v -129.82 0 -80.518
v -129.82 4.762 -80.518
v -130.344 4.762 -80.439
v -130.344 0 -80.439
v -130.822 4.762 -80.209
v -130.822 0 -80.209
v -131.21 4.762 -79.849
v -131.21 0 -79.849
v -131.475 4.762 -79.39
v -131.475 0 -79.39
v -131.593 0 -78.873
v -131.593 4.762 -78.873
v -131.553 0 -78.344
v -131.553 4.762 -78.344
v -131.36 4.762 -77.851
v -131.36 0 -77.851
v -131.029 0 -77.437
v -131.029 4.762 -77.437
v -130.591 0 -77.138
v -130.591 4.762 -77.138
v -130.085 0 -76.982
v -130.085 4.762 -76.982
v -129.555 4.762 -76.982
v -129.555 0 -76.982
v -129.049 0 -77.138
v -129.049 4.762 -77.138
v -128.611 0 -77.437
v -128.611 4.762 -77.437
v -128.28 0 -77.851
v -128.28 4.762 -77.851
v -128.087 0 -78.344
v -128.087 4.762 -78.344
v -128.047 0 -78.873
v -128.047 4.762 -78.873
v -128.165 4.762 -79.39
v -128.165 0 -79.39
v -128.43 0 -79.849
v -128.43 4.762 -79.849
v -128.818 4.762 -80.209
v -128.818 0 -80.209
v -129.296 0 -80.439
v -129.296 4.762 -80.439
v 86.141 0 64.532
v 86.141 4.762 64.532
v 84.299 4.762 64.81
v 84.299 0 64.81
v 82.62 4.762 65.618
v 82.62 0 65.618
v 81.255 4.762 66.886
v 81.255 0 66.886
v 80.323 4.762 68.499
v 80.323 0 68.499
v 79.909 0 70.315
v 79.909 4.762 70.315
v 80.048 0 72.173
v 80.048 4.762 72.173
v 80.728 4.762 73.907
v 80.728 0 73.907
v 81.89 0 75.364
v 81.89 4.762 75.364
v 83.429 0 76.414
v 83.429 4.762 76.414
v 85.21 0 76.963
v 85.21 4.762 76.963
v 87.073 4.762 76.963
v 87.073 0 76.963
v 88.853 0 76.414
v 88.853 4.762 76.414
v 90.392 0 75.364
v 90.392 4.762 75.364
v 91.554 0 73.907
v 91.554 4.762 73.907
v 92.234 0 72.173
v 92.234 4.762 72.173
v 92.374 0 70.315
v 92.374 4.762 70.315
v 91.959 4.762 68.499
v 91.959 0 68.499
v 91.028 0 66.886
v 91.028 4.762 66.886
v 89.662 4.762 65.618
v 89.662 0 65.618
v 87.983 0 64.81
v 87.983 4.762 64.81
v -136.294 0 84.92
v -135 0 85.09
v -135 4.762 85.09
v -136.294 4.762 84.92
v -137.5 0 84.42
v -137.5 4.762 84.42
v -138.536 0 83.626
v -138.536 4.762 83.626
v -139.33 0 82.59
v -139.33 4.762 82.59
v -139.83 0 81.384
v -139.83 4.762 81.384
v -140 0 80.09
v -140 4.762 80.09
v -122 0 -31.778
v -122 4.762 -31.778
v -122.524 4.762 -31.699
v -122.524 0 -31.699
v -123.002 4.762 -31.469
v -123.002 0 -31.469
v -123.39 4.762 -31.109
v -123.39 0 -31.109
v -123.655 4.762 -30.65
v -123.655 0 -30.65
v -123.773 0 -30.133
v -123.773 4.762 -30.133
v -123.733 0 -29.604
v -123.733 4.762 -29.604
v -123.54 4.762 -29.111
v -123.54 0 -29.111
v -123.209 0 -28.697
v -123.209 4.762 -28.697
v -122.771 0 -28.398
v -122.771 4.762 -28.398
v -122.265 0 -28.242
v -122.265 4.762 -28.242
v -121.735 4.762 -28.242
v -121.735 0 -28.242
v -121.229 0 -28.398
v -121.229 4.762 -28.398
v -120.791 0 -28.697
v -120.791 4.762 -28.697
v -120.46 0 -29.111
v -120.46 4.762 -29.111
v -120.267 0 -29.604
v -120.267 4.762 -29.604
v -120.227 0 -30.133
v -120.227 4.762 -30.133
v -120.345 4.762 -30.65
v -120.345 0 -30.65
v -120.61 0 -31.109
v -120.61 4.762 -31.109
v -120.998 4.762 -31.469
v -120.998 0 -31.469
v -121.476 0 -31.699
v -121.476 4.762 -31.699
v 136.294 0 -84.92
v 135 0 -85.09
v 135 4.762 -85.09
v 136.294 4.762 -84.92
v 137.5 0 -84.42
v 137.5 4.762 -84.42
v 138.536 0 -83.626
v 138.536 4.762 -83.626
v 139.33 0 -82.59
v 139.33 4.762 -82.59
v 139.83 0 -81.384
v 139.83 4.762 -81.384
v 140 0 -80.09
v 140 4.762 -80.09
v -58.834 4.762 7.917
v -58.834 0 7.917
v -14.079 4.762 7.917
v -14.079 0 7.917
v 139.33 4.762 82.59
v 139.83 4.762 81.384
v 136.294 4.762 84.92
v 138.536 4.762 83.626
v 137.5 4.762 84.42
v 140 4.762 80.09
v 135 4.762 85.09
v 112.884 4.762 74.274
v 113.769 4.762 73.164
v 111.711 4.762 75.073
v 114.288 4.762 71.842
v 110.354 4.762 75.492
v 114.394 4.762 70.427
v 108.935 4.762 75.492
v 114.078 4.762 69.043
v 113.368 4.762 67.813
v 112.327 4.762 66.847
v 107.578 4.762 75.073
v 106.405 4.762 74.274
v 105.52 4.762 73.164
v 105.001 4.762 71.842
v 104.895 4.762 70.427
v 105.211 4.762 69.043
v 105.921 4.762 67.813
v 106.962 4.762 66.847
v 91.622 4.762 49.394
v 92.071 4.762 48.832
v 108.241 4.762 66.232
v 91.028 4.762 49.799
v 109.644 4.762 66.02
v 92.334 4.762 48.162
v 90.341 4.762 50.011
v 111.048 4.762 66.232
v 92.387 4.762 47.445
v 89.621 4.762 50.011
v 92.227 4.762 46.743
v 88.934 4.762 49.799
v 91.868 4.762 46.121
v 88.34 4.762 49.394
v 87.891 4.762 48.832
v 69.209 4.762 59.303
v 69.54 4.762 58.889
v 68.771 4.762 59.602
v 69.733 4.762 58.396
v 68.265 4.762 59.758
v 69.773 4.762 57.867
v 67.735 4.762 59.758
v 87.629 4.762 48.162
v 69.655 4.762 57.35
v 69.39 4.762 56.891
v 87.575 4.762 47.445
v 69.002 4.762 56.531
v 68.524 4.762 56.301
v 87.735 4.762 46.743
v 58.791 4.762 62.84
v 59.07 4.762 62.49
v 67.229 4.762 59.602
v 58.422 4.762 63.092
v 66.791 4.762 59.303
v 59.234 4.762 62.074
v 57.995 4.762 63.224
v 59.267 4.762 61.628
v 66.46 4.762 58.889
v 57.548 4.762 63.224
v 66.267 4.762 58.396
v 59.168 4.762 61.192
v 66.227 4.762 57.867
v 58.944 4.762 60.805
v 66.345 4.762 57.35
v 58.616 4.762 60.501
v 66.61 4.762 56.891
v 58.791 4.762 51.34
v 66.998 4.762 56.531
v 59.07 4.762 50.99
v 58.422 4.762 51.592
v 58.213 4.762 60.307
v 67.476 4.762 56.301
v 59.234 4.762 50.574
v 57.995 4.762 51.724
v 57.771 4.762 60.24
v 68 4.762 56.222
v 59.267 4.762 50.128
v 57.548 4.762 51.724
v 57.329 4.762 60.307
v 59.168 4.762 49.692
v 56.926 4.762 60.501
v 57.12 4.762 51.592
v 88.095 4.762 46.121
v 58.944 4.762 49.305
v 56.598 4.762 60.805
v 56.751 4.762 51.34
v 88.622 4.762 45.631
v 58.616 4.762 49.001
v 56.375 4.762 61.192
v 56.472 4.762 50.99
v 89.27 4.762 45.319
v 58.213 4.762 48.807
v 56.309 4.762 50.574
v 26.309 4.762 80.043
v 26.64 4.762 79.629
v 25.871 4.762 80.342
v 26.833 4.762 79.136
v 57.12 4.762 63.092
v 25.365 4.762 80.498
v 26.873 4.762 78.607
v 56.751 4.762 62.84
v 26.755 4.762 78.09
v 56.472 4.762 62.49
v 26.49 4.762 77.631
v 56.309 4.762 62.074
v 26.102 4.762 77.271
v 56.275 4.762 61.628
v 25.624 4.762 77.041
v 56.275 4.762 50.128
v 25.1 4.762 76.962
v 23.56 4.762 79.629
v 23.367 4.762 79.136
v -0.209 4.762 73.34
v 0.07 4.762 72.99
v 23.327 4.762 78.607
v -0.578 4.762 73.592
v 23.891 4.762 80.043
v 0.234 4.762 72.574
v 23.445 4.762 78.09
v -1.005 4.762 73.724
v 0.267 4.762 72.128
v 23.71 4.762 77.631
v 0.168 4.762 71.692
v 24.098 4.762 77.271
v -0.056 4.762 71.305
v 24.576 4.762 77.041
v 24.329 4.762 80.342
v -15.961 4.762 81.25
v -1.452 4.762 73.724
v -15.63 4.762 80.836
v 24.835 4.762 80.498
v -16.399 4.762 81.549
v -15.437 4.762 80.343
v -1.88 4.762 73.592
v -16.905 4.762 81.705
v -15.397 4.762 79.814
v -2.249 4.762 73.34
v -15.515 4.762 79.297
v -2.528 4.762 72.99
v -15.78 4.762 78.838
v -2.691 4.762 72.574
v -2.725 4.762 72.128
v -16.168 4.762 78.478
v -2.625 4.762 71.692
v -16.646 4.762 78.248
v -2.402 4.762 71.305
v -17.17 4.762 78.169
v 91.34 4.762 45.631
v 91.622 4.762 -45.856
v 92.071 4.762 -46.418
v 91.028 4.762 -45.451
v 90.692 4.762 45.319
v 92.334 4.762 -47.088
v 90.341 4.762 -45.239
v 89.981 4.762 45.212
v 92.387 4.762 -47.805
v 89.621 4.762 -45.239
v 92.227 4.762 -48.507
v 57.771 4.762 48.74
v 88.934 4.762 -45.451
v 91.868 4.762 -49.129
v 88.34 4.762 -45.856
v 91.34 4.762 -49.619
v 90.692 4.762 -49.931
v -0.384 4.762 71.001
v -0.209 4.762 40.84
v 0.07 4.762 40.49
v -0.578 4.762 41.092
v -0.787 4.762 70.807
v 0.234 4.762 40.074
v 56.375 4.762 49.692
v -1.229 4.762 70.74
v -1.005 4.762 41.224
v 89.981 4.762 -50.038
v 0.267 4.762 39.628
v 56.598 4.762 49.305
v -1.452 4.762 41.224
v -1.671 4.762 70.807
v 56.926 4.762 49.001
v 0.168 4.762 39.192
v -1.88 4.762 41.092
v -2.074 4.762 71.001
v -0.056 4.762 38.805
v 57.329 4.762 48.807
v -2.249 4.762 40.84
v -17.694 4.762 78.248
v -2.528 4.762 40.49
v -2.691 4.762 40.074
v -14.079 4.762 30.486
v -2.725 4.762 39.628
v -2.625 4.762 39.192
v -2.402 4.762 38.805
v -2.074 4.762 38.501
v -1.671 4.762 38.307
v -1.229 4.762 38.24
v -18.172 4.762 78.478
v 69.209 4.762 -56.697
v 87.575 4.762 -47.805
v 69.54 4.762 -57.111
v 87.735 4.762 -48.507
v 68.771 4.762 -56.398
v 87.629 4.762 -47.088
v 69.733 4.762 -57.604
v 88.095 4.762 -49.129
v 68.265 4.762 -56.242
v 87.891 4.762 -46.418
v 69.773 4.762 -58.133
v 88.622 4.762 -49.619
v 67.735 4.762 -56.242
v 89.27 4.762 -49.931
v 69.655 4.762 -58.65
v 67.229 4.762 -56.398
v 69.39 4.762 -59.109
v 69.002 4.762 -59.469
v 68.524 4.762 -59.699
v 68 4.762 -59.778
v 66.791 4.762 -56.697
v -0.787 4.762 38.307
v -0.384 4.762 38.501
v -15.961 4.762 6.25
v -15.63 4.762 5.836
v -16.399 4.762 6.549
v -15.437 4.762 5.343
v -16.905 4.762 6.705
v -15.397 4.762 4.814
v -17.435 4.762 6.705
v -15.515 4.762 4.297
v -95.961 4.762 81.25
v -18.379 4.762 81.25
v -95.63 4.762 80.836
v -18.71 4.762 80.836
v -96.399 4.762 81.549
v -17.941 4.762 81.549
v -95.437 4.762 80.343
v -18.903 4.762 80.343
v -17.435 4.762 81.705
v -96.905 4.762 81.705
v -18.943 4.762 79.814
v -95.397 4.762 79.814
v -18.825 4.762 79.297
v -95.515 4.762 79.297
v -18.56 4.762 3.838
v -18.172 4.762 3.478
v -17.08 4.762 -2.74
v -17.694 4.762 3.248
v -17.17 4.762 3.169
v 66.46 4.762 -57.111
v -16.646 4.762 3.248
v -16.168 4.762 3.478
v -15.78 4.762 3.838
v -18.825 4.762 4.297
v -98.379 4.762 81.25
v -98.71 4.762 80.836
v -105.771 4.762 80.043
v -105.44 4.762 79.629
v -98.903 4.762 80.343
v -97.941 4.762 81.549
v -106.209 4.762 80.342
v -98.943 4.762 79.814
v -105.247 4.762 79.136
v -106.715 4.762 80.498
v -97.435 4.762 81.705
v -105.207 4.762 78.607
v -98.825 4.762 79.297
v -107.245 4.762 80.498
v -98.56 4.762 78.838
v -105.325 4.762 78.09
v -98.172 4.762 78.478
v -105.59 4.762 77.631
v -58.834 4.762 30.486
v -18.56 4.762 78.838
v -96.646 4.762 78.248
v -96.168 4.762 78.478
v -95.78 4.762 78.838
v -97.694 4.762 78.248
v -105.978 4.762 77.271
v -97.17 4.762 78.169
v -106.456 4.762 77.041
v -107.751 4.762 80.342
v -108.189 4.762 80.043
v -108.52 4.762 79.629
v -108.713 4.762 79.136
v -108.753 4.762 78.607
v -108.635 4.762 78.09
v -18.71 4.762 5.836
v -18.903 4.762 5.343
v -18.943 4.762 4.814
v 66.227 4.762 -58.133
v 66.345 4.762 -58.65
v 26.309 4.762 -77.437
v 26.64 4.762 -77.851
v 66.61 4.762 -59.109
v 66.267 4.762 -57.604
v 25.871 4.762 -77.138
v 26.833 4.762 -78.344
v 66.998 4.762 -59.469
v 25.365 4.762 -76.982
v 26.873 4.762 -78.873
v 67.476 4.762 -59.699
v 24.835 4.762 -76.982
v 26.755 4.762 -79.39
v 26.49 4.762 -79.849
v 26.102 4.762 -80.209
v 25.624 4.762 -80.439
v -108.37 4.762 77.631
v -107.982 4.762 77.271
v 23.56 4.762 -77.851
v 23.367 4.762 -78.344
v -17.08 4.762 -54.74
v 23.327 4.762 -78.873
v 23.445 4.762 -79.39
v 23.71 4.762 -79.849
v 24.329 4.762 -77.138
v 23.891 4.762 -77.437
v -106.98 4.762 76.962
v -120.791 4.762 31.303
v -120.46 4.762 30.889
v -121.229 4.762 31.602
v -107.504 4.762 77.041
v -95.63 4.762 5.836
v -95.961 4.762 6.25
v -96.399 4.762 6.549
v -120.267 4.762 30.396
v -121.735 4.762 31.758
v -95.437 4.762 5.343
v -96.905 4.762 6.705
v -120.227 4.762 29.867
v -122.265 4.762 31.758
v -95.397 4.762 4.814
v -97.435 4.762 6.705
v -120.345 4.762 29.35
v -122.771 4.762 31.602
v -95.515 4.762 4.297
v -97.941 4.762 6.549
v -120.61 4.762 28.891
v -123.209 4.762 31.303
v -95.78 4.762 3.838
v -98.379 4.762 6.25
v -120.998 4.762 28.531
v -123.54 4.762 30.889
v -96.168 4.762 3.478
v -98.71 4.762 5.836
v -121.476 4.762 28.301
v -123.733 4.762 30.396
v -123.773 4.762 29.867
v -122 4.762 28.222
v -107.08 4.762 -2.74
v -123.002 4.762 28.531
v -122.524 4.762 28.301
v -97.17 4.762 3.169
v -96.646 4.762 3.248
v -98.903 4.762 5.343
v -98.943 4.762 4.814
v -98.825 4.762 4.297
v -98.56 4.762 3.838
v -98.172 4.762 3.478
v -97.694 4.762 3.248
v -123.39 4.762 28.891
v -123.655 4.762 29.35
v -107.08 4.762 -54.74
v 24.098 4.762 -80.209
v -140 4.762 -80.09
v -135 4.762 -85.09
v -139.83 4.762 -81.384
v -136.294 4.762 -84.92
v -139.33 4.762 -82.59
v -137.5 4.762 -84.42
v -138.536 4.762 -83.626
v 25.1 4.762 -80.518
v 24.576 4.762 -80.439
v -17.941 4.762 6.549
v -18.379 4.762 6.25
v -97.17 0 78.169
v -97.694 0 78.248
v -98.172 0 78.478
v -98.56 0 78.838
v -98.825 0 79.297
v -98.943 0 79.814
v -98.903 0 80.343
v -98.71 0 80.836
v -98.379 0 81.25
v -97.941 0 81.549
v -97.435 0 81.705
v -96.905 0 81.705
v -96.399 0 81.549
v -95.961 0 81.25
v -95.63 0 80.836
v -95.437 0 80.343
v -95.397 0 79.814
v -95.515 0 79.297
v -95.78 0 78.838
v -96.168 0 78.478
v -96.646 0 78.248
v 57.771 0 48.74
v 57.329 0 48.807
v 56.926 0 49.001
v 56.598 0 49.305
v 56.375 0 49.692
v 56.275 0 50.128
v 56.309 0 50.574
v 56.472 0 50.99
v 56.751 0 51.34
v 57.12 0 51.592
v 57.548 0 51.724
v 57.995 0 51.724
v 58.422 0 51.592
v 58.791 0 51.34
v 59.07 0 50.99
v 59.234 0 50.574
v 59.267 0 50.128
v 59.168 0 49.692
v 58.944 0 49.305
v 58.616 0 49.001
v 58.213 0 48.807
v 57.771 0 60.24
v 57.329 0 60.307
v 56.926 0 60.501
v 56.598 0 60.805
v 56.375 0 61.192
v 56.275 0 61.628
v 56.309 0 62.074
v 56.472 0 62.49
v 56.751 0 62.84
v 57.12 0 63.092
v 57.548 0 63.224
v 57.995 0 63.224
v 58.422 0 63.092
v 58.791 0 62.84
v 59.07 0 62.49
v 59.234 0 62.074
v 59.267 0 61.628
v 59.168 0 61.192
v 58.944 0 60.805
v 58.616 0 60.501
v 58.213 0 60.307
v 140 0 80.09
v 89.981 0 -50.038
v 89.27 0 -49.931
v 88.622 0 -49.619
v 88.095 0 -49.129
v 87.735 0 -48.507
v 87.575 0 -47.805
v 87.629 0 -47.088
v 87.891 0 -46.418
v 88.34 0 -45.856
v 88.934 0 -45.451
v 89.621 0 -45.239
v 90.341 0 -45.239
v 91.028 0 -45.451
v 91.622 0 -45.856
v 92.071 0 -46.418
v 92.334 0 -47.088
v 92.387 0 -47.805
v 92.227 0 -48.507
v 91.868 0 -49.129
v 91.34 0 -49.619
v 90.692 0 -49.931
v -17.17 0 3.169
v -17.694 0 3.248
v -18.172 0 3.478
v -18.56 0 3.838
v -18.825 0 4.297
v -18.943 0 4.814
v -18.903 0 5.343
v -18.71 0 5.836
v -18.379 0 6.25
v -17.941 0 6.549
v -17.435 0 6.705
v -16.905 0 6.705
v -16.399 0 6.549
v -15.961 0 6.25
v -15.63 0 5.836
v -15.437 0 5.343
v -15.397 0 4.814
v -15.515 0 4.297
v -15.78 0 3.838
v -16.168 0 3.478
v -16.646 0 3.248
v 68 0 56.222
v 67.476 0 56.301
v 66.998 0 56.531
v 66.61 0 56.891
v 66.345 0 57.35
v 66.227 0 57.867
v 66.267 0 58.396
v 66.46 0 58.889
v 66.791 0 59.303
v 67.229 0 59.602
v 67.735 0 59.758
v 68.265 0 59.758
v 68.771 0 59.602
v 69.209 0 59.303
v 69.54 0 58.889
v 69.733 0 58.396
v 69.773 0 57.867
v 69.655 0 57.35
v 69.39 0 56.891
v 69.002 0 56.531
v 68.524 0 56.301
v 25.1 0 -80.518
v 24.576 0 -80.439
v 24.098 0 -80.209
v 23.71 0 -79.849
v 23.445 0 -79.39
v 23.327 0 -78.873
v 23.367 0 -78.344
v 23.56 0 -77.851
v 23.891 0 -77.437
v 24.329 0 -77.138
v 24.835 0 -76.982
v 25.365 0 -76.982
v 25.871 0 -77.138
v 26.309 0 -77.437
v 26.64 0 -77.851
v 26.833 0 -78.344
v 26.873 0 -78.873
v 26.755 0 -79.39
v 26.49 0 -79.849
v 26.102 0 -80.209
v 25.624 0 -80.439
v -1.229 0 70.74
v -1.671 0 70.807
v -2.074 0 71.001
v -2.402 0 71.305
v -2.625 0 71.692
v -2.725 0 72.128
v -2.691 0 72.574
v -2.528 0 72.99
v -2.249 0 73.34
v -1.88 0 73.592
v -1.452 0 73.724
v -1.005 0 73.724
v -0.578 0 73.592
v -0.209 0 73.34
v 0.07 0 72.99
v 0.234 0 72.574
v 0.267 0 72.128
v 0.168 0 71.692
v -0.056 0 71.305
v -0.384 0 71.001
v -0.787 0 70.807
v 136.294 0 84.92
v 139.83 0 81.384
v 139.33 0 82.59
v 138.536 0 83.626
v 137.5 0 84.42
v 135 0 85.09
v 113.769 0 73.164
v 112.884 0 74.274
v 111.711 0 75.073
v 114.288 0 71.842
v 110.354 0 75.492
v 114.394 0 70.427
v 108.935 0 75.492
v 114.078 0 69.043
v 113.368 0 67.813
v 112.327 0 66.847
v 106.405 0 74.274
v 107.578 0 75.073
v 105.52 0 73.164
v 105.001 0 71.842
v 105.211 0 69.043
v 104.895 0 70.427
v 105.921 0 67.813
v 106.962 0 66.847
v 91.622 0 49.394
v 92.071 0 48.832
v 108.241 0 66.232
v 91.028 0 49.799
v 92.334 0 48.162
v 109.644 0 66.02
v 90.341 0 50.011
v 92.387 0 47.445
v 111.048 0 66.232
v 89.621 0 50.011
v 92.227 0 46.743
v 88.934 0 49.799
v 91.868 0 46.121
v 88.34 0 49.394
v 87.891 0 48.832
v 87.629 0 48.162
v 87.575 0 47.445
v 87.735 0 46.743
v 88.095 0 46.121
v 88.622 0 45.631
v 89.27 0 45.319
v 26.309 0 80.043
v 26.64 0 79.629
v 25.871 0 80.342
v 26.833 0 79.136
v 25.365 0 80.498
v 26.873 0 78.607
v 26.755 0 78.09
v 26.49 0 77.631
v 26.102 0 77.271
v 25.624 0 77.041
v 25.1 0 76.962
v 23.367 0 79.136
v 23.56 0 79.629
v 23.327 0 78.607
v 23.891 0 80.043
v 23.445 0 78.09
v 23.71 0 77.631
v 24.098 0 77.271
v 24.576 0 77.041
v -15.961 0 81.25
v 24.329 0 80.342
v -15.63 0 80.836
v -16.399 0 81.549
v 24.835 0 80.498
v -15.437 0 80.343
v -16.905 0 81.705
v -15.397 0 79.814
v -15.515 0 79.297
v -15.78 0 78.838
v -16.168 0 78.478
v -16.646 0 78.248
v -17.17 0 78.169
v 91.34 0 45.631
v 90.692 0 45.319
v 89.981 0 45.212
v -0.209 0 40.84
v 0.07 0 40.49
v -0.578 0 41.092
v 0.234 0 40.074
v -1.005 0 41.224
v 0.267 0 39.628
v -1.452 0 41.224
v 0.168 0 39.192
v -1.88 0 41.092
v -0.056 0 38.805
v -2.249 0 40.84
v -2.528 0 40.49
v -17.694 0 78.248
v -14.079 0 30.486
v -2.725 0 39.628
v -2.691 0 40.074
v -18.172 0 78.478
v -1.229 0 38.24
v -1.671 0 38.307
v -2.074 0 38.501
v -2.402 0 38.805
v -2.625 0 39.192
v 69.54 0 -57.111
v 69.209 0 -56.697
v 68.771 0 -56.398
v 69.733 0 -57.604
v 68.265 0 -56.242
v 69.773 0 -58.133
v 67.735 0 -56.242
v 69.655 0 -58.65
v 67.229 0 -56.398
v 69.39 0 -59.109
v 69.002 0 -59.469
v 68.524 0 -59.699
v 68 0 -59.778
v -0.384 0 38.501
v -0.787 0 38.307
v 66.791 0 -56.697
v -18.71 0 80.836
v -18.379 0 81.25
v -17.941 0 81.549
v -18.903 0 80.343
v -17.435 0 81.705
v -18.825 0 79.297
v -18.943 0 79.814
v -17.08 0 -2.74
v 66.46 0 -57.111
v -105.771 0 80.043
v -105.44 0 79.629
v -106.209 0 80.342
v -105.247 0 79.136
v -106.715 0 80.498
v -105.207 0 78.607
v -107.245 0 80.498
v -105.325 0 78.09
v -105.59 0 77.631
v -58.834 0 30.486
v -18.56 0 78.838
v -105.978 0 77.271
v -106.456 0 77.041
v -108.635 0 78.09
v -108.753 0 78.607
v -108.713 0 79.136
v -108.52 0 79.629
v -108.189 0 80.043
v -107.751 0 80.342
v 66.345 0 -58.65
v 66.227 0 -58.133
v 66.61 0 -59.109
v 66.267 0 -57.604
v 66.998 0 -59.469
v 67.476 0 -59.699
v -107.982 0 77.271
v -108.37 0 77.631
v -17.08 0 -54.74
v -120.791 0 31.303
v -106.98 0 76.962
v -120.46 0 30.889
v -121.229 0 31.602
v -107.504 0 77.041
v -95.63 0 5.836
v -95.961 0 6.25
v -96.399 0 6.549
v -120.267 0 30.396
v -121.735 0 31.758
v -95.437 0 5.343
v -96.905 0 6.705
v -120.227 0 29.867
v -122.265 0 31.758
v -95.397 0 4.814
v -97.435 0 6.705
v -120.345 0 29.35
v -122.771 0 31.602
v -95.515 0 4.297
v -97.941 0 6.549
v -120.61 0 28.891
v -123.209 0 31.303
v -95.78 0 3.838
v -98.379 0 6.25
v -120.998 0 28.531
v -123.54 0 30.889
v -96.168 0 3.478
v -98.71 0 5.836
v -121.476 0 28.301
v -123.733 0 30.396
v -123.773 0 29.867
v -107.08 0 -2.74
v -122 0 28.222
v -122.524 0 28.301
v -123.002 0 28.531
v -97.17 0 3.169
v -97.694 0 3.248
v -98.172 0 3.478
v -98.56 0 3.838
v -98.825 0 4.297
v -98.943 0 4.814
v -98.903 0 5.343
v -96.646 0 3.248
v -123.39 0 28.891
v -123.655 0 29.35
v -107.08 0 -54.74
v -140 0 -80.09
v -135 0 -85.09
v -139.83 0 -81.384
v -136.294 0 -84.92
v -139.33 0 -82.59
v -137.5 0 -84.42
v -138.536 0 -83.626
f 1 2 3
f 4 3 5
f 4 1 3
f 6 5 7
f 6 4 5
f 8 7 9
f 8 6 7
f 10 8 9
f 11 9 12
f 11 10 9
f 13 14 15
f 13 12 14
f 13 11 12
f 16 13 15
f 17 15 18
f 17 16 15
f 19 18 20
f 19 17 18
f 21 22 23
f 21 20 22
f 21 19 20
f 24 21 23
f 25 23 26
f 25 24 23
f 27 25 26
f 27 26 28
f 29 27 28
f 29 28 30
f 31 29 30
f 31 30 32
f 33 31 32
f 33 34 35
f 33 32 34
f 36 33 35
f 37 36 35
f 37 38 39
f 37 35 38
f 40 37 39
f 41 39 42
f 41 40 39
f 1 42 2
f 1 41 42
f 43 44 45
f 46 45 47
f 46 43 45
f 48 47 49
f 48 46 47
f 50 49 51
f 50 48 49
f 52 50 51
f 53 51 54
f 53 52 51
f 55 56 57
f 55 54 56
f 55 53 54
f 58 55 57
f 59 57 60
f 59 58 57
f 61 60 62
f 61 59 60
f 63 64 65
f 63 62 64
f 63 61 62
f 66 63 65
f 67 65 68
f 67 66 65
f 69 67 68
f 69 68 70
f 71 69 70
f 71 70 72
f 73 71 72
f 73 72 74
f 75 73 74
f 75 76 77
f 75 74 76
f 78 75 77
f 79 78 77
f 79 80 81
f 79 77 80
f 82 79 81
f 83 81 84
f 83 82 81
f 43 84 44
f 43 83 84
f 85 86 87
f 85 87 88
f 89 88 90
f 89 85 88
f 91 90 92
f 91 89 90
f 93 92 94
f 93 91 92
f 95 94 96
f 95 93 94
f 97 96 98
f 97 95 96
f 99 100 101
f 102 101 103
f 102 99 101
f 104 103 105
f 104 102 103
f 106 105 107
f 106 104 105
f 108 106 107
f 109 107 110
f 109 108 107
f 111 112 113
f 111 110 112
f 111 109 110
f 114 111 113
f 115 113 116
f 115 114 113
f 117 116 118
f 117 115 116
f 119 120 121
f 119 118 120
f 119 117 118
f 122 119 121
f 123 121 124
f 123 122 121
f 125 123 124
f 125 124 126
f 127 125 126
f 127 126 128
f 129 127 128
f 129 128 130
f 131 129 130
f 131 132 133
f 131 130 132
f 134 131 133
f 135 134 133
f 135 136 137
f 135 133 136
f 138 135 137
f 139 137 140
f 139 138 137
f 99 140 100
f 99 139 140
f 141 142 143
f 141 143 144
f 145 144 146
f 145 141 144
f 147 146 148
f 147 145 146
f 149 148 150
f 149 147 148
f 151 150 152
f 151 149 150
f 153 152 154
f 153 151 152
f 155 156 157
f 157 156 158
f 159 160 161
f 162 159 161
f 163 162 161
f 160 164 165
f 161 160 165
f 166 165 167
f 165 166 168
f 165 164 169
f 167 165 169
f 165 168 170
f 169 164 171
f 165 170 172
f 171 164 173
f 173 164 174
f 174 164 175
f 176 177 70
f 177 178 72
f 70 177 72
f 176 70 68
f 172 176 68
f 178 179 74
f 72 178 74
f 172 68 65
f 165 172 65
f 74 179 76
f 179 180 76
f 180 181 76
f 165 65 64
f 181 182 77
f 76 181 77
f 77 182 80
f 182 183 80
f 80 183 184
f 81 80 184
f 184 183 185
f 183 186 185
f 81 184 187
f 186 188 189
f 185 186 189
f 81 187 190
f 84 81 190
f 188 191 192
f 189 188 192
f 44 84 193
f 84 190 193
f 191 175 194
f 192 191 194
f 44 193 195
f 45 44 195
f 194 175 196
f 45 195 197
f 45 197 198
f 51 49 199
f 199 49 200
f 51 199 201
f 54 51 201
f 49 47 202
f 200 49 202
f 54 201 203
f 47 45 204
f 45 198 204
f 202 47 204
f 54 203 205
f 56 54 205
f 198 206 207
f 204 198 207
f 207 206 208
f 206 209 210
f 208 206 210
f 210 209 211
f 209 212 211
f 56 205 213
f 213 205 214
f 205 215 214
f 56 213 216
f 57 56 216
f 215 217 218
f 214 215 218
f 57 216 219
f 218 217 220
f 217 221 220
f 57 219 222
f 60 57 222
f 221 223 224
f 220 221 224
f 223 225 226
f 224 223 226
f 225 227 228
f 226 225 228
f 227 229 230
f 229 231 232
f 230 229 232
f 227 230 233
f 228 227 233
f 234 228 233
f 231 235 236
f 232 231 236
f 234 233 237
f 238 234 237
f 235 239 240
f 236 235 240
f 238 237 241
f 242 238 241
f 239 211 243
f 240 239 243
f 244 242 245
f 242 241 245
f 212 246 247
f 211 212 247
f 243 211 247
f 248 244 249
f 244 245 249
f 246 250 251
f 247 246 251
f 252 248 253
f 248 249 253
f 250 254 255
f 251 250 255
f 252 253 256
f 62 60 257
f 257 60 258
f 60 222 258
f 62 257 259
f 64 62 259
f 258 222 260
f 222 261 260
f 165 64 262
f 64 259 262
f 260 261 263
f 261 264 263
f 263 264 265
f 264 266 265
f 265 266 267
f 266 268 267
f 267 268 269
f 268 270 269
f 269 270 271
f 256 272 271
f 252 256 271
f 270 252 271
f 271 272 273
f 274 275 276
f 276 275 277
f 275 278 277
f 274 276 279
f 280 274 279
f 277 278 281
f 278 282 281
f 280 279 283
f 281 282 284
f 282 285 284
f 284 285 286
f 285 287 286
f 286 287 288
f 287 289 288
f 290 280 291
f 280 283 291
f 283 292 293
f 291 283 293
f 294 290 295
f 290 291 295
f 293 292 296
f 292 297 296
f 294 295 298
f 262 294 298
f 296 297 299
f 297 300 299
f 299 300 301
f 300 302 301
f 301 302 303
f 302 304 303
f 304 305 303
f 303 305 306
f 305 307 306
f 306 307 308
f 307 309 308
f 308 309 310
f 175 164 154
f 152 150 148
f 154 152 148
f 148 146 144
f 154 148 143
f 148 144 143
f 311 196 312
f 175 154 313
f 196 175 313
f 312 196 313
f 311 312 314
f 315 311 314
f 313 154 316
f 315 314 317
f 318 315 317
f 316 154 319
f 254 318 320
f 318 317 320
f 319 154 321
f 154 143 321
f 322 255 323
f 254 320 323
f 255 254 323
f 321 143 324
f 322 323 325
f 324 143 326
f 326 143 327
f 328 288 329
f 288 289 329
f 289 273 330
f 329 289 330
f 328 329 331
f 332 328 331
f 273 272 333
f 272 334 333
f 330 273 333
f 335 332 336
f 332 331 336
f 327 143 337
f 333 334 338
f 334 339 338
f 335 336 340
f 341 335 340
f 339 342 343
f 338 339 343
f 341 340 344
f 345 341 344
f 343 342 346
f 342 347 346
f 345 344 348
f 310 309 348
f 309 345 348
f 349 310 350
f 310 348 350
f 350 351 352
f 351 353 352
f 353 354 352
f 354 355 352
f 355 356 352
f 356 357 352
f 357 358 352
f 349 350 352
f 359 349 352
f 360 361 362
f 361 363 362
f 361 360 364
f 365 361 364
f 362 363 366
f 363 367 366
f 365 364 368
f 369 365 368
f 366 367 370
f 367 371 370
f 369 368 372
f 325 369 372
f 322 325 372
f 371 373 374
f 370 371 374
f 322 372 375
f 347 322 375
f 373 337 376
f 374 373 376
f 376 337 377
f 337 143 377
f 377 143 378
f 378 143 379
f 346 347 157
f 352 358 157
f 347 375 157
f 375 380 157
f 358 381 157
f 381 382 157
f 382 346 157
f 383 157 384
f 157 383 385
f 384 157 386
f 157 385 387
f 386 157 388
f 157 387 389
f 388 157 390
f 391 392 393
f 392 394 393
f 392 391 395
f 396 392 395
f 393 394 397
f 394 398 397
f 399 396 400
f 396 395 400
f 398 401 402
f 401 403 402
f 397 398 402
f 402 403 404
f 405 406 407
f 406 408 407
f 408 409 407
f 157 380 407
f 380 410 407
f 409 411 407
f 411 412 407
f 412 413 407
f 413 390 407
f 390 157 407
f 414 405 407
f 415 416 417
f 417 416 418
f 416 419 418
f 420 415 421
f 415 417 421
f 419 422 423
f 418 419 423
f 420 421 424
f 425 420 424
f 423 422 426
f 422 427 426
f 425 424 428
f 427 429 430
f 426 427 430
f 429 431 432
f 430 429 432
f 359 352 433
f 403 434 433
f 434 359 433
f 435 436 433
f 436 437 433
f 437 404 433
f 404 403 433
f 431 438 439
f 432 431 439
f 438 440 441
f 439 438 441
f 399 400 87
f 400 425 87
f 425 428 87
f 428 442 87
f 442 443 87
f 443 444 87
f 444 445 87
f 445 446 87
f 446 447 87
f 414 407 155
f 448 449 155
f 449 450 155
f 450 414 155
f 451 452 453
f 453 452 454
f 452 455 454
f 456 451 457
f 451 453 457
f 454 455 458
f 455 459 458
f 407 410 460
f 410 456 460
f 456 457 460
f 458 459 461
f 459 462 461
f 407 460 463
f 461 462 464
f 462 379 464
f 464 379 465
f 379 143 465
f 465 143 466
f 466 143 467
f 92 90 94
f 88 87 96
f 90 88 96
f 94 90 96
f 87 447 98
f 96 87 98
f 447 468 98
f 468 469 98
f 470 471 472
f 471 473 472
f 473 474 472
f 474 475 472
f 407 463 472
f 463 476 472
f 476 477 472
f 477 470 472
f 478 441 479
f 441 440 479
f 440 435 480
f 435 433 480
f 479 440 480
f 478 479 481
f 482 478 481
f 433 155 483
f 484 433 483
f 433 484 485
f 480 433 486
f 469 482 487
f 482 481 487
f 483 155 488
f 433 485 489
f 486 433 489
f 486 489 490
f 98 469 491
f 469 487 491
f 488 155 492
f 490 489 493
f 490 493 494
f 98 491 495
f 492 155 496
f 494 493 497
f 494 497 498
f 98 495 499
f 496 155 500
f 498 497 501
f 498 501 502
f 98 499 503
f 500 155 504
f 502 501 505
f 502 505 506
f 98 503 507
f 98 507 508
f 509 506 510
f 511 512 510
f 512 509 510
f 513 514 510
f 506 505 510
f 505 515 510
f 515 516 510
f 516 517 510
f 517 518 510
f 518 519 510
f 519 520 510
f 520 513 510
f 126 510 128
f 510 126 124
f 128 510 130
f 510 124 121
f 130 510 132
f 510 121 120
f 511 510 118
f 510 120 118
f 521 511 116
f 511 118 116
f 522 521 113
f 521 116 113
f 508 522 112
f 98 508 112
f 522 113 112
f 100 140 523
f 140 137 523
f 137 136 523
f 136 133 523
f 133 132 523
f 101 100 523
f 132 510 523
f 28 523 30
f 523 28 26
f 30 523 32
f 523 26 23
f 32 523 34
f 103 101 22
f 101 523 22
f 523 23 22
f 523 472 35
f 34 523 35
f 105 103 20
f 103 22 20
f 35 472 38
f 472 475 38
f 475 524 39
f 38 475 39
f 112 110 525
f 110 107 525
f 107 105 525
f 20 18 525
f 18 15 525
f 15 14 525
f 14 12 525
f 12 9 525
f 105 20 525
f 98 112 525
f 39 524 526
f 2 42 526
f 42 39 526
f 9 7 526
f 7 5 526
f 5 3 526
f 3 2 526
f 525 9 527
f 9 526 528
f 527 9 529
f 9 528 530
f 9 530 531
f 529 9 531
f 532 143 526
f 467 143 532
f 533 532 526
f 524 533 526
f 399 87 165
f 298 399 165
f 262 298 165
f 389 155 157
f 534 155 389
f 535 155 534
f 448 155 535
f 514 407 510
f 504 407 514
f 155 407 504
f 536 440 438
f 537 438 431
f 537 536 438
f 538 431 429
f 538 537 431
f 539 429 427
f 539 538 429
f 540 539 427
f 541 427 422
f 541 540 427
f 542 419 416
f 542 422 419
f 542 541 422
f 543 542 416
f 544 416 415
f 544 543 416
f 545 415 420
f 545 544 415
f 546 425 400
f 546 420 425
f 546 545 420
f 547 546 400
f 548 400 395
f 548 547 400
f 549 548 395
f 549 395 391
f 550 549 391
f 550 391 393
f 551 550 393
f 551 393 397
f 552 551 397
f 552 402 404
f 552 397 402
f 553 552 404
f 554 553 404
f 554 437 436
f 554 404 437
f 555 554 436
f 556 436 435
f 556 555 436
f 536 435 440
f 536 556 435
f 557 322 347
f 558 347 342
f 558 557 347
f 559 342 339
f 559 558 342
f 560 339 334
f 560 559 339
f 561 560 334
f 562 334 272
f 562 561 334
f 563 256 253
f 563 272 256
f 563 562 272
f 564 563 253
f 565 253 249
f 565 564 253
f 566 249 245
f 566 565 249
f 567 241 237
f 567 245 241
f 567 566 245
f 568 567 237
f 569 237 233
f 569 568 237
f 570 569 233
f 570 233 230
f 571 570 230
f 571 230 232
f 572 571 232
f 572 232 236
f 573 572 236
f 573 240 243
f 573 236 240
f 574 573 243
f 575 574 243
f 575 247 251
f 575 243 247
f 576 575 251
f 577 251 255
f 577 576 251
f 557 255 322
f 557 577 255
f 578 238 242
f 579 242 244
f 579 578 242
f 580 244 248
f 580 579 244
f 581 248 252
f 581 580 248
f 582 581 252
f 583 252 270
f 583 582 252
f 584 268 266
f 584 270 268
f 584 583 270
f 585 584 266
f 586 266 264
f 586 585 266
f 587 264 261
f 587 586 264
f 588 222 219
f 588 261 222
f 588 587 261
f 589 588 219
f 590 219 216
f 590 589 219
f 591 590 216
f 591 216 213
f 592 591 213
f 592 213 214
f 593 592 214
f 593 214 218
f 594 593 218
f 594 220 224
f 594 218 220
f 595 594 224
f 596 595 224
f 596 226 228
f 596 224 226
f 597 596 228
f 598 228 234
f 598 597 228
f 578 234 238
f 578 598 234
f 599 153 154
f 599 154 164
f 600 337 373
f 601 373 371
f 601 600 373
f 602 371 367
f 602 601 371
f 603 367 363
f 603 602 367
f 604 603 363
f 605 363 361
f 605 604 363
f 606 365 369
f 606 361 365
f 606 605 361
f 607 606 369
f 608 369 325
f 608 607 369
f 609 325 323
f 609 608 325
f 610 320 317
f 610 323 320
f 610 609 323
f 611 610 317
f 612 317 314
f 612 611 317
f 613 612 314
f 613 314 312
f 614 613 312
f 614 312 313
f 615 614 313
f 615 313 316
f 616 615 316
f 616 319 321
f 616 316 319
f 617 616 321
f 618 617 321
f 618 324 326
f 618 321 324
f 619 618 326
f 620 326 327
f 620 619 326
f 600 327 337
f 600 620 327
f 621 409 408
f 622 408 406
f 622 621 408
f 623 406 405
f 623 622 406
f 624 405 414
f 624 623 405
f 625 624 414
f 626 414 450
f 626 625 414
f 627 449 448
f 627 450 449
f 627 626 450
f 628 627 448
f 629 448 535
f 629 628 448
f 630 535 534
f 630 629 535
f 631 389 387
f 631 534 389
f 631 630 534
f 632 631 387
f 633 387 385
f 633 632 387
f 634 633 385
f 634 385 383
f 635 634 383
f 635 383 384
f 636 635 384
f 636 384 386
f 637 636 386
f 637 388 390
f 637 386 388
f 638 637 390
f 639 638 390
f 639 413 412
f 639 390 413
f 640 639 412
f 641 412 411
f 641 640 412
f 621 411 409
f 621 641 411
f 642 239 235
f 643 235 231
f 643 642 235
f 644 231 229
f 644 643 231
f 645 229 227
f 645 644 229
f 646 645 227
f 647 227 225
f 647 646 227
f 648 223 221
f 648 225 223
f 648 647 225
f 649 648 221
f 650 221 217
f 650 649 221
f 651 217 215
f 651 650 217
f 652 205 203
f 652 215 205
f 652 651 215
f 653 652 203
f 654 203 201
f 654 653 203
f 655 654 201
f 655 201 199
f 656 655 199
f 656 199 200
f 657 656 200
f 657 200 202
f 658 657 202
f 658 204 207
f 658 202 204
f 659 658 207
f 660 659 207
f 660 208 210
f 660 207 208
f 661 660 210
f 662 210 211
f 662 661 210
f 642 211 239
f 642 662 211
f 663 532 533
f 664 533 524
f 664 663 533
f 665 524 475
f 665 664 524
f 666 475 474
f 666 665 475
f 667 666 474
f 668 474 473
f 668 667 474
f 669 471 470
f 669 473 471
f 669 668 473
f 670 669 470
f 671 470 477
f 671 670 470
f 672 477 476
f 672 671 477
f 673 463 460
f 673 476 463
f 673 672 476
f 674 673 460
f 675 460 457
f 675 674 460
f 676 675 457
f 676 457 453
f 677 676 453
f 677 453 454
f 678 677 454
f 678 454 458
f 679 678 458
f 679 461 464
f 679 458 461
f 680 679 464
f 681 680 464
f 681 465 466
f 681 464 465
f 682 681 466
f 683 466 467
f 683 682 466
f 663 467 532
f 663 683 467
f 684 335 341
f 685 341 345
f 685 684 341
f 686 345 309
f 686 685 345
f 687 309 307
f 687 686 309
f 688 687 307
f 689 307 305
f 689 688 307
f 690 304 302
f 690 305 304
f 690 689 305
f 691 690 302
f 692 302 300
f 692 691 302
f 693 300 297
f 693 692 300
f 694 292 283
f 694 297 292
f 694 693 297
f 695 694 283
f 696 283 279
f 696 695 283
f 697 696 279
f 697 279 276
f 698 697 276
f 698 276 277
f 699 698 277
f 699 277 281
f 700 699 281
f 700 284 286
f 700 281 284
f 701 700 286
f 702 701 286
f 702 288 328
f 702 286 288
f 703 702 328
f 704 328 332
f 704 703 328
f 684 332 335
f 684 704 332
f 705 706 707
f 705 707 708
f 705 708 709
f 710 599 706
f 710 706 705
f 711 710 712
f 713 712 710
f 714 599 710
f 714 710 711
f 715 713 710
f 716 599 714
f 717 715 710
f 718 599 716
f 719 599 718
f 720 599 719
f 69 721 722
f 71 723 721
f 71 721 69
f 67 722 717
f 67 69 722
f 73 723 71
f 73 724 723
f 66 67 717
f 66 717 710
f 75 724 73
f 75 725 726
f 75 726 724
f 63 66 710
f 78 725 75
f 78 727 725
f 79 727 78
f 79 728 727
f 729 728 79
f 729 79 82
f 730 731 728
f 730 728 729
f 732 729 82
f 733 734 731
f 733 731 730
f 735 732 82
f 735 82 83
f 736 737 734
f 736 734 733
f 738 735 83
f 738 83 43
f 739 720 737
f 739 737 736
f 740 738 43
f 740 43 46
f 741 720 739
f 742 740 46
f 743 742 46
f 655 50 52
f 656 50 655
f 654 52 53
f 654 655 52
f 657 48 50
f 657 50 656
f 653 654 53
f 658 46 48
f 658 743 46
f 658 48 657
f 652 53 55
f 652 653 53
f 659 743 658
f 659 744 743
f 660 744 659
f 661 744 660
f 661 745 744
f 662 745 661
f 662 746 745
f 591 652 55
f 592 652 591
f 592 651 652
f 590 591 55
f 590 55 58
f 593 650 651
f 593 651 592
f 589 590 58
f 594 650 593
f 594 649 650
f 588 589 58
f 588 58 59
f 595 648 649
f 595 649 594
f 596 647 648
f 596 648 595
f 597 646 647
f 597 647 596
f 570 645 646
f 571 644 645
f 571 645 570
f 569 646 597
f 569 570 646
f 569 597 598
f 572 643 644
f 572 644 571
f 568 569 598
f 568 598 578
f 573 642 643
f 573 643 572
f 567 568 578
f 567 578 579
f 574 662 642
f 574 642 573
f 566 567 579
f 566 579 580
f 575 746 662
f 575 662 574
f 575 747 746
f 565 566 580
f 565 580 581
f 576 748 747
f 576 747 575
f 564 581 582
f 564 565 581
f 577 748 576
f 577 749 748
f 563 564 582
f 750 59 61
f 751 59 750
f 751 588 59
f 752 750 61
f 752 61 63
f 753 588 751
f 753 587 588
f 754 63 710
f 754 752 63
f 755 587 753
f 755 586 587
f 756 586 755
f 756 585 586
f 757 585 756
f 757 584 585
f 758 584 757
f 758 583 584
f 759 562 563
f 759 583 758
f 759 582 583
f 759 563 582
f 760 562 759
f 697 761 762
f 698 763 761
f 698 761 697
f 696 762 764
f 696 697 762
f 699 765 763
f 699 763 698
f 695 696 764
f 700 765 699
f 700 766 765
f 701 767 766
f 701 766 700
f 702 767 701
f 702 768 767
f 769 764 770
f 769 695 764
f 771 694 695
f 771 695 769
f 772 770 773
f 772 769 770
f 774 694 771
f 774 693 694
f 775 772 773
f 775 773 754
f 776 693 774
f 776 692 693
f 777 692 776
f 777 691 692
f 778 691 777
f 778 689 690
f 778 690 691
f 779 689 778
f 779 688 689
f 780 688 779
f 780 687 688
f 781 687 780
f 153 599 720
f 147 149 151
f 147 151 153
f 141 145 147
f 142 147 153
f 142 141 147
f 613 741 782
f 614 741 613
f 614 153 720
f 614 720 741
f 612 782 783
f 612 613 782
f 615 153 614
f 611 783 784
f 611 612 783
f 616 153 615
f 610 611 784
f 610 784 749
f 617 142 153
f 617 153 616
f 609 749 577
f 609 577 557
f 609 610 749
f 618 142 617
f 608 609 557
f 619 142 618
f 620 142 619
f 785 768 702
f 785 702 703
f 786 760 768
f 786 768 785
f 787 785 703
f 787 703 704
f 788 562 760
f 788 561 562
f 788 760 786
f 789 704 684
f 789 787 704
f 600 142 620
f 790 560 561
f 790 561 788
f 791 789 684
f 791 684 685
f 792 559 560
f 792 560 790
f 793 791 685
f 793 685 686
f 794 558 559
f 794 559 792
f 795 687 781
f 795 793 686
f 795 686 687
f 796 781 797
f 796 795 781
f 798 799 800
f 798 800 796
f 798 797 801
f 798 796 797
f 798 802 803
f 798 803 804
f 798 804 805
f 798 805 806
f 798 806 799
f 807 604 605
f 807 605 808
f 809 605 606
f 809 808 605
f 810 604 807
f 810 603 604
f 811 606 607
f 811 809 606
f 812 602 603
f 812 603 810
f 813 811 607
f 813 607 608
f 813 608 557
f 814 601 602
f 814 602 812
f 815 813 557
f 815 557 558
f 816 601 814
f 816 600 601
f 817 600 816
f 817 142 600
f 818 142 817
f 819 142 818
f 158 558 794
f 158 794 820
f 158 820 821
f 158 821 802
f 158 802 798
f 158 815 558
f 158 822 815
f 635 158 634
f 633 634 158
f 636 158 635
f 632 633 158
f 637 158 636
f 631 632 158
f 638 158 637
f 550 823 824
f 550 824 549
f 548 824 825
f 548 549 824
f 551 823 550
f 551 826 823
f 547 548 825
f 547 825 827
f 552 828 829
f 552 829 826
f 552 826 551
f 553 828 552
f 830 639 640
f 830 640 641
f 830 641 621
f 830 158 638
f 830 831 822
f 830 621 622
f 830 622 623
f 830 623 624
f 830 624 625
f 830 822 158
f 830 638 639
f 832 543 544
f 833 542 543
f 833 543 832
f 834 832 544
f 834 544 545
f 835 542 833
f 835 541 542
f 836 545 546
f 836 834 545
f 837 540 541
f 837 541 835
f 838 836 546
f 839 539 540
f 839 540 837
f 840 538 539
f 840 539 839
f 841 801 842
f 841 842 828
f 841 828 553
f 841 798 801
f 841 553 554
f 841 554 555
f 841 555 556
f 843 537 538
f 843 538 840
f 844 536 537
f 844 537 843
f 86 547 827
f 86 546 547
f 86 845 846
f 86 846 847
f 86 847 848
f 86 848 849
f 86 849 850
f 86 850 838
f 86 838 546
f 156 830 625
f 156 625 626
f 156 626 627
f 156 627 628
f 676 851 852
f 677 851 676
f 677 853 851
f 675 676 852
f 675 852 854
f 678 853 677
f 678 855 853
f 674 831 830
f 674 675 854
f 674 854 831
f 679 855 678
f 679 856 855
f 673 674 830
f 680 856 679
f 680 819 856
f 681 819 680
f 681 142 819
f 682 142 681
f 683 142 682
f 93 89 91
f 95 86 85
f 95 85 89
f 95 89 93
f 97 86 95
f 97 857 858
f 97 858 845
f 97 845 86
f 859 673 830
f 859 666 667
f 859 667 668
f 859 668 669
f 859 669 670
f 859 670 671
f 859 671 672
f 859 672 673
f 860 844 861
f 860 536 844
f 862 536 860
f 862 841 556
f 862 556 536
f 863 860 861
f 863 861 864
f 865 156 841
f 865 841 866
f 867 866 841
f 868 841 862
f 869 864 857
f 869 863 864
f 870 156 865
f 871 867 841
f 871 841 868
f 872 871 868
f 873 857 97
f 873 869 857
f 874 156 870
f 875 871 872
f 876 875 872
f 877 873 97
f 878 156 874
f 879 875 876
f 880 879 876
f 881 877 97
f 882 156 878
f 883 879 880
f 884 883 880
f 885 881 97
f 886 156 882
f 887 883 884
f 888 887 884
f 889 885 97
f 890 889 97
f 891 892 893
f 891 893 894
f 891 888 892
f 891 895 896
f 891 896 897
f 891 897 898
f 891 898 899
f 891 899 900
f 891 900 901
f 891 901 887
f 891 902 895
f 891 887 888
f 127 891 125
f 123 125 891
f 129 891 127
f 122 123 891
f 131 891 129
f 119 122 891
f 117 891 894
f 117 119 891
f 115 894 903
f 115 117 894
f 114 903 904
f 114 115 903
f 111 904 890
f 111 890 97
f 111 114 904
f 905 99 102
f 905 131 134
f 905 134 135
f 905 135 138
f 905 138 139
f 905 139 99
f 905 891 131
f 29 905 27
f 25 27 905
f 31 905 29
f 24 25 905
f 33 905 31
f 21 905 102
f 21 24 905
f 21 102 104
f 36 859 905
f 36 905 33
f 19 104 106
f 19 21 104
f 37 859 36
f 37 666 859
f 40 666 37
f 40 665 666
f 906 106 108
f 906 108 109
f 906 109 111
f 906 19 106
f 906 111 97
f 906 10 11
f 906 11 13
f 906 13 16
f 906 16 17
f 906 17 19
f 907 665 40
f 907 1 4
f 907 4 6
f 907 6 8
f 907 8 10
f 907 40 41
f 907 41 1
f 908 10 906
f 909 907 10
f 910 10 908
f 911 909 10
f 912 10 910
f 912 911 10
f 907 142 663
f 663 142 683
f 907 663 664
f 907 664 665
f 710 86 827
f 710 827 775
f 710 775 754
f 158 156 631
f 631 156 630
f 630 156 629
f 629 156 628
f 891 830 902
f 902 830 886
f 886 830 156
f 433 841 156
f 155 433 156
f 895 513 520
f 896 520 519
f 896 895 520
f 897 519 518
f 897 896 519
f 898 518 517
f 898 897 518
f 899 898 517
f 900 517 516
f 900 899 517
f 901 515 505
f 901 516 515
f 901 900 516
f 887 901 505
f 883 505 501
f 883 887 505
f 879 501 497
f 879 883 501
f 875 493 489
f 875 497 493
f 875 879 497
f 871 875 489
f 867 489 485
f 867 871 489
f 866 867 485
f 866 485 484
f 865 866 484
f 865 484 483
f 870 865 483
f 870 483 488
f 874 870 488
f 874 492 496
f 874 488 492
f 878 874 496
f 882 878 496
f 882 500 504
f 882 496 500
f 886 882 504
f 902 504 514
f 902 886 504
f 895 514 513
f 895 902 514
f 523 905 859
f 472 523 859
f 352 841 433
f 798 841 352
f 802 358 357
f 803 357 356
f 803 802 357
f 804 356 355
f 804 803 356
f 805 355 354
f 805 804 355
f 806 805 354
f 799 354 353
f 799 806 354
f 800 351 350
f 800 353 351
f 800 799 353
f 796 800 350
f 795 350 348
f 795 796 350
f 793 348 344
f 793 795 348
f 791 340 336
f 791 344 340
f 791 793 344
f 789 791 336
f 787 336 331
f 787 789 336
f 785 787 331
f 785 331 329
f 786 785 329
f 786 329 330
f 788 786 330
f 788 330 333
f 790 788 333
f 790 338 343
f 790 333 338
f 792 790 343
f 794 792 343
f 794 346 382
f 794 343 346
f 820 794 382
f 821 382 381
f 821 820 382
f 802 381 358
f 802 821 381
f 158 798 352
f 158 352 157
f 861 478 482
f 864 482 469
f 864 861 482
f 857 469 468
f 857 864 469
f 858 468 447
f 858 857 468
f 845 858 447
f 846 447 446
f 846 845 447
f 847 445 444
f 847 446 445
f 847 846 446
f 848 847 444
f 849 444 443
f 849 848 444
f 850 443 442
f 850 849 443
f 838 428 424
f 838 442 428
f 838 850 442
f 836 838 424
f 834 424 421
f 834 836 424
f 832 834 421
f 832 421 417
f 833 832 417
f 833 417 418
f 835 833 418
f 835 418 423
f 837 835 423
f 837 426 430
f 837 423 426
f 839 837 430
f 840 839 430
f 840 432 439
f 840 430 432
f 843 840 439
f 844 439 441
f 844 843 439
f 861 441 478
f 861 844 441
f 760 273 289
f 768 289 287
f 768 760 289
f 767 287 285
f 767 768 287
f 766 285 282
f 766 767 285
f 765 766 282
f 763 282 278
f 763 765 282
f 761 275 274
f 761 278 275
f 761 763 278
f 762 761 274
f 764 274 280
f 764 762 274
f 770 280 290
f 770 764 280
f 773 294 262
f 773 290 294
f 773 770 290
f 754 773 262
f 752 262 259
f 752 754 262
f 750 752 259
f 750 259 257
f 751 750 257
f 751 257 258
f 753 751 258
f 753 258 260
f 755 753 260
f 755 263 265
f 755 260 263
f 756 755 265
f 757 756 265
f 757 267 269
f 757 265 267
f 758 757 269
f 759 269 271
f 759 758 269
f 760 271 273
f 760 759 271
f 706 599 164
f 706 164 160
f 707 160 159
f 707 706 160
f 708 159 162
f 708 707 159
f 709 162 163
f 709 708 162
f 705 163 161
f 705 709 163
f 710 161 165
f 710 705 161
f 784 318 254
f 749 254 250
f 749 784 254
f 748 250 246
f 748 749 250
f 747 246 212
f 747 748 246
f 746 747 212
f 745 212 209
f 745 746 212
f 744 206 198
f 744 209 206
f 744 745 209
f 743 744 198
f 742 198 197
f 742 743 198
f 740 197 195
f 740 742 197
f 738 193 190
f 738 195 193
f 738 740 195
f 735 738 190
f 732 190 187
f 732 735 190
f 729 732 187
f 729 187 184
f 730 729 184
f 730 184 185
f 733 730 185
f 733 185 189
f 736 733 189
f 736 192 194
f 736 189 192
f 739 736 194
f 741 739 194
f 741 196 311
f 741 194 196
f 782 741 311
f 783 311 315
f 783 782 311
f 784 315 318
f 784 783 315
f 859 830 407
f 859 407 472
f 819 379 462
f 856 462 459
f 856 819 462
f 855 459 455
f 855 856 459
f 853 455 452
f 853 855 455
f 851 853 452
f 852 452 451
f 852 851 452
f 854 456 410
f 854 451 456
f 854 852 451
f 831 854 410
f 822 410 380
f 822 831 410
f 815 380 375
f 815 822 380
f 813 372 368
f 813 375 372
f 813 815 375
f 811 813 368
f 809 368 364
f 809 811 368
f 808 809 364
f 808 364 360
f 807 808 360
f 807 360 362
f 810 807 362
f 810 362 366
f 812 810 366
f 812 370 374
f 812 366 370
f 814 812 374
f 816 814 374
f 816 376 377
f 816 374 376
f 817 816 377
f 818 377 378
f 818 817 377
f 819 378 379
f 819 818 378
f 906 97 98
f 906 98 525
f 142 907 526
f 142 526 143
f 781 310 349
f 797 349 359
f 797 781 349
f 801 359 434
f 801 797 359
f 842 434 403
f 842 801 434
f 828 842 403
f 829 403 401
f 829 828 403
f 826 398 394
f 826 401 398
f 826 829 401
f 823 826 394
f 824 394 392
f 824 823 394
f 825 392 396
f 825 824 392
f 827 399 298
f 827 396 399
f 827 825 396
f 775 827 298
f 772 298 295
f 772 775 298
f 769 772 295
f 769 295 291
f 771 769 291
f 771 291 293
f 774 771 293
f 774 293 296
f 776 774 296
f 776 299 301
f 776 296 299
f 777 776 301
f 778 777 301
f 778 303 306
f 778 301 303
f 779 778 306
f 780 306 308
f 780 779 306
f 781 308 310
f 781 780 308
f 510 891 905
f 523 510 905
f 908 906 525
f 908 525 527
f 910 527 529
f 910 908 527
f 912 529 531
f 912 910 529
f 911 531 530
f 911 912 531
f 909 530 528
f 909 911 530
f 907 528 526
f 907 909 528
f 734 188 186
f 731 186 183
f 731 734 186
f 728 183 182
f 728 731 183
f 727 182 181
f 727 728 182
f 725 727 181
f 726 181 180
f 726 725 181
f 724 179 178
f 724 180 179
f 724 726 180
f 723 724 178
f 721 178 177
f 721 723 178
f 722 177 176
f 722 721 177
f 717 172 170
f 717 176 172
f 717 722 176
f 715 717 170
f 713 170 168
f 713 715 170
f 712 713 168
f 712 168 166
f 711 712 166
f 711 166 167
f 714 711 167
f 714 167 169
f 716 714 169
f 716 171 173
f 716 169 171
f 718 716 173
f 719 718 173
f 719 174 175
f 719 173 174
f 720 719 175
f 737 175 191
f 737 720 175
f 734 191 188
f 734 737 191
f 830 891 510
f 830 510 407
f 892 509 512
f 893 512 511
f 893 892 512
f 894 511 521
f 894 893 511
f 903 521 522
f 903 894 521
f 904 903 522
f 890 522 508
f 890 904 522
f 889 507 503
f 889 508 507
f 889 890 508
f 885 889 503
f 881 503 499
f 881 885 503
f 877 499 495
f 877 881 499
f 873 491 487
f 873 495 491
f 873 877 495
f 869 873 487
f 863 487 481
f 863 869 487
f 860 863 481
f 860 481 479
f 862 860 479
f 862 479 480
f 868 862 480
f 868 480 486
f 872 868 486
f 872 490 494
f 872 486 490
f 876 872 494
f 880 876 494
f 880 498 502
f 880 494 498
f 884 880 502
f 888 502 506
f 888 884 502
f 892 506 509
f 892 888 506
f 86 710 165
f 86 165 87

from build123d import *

# Parameters (mm, degrees)
BOSS_EXTRUDE1_DEPTH          = 4.7625
SKETCH2_R                    = 1.778
CHASSIS_STANDOFF_DEPTH       = 164.899327351
SKETCH3_R                    = 1.5
VESC_DEPTH                   = 164.899327351
SKETCH13_R                   = 1.778
SKETCH13_W                   = 44.755773095
SKETCH13_H                   = 22.569704292
PCB_DEPTH                    = 164.899327351
SKETCH6_W                    = 90
SKETCH6_H                    = 52
JETSON_DEPTH                 = 164.899327351
SKETCH12_R                   = 1.778
TOP_PLATE_STANDOFF_DEPTH     = 164.899327351
SKETCH14_R                   = 2.413
VELODYNE_INTERFACE_BOX_DEPTH = 164.899327351
SKETCH16_R                   = 6.25
SKETCH16_R_2                 = 4.7625
SWITCH_DEPTH                 = 164.899327351


with BuildPart() as part:
    # Sketch1 → Boss-Extrude1 (new body)
    with BuildSketch(Plane(origin=(0, 0, 0), x_dir=(1, 0, 0), z_dir=(0, 1, 0))):
        with BuildLine():
            Line((-135, 85.09), (135, 85.09))
            ThreePointArc((135, 85.09), (138.535533906, 83.625533906), (140, 80.09))
            Line((140, 80.09), (140, -80.09))
            ThreePointArc((140, -80.09), (138.535533906, -83.625533906), (135, -85.09))
            Line((135, -85.09), (-135, -85.09))
            ThreePointArc((-135, -85.09), (-138.535533906, -83.625533906), (-140, -80.09))
            Line((-140, -80.09), (-140, 80.09))
            ThreePointArc((-140, 80.09), (-138.535533906, 83.625533906), (-135, 85.09))
        make_face()
    extrude(amount=BOSS_EXTRUDE1_DEPTH)

    # Sketch2 → chassis standoff (cut, through all)
    with BuildSketch(Plane(origin=(0, 0, 0), x_dir=(1, 0, 0), z_dir=(0, 1, 0))):
        with Locations(Location((68, 58, 0), (0, 0, 90))):
            Circle(SKETCH2_R)
        with Locations(Location((68, -58, 0), (0, 0, 90))):
            Circle(SKETCH2_R)
        with Locations(Location((-122, 30, 0), (0, 0, 90))):
            Circle(SKETCH2_R)
        with Locations(Location((-122, -30, 0), (0, 0, 90))):
            Circle(SKETCH2_R)
    extrude(amount=CHASSIS_STANDOFF_DEPTH, mode=Mode.SUBTRACT)

    # Sketch3 → vesc (cut, through all)
    with BuildSketch(Plane(origin=(0, 0, 0), x_dir=(1, 0, 0), z_dir=(0, 1, 0))):
        with Locations(Location((57.771213393, -50.24032748, 0), (0, 0, 90))):
            Circle(SKETCH3_R)
        with Locations(Location((57.771213393, -61.74032748, 0), (0, 0, 90))):
            Circle(SKETCH3_R)
        with Locations(Location((-1.228786607, -39.74032748, 0), (0, 0, 90))):
            Circle(SKETCH3_R)
        with Locations(Location((-1.228786607, -72.24032748, 0), (0, 0, 90))):
            Circle(SKETCH3_R)
    extrude(amount=VESC_DEPTH, mode=Mode.SUBTRACT)

    # Sketch13 → pcb (cut, through all)
    with BuildSketch(Plane(origin=(0, 0, 0), x_dir=(1, 0, 0), z_dir=(0, 1, 0))):
        with Locations(Location((-97.170021332, -4.946954695, 0), (0, 0, 90))):
            Circle(SKETCH13_R)
        with Locations(Location((-17.170021332, -4.946954695, 0), (0, 0, 90))):
            Circle(SKETCH13_R)
        with Locations(Location((-17.170021332, -79.946954695, 0), (0, 0, 90))):
            Circle(SKETCH13_R)
        with Locations(Location((-97.170021332, -79.946954695, 0), (0, 0, 90))):
            Circle(SKETCH13_R)
        with Locations((-36.456414677, -19.201465216)):
            Rectangle(SKETCH13_W, SKETCH13_H)
    extrude(amount=PCB_DEPTH, mode=Mode.SUBTRACT)

    # Sketch6 → jetson (cut, through all)
    with BuildSketch(Plane(origin=(0, 0, 0), x_dir=(1, 0, 0), z_dir=(0, 1, 0))):
        with Locations((-62.08, 28.74)):
            Rectangle(SKETCH6_W, SKETCH6_H)
    extrude(amount=JETSON_DEPTH, mode=Mode.SUBTRACT)

    # Sketch12 → top plate standoff (cut, through all)
    with BuildSketch(Plane(origin=(0, 0, 0), x_dir=(1, 0, 0), z_dir=(0, 1, 0))):
        with Locations(Location((-129.82, 78.74, 0), (0, 0, 90))):
            Circle(SKETCH12_R)
        with Locations(Location((-106.98, -78.74, 0), (0, 0, 90))):
            Circle(SKETCH12_R)
        with Locations(Location((25.1, 78.74, 0), (0, 0, 90))):
            Circle(SKETCH12_R)
        with Locations(Location((25.1, -78.74, 0), (0, 0, 90))):
            Circle(SKETCH12_R)
    extrude(amount=TOP_PLATE_STANDOFF_DEPTH, mode=Mode.SUBTRACT)

    # Sketch14 → velodyne interface box (cut, through all)
    with BuildSketch(Plane(origin=(0, 0, 0), x_dir=(1, 0, 0), z_dir=(0, 1, 0))):
        with Locations(Location((89.981111903, 47.625, 0), (0, 0, 90))):
            Circle(SKETCH14_R)
        with Locations(Location((89.981111903, -47.625, 0), (0, 0, 90))):
            Circle(SKETCH14_R)
    extrude(amount=VELODYNE_INTERFACE_BOX_DEPTH, mode=Mode.SUBTRACT)

    # Sketch16 → switch (cut, through all)
    with BuildSketch(Plane(origin=(0, 0, 0), x_dir=(1, 0, 0), z_dir=(0, 1, 0))):
        with Locations(Location((86.14110244, -70.782450254, 0), (0, 0, 90))):
            Circle(SKETCH16_R)
        with Locations(Location((109.644443051, -70.782450254, 0), (0, 0, 90))):
            Circle(SKETCH16_R_2)
    extrude(amount=SWITCH_DEPTH, mode=Mode.SUBTRACT)


solid = part.part
